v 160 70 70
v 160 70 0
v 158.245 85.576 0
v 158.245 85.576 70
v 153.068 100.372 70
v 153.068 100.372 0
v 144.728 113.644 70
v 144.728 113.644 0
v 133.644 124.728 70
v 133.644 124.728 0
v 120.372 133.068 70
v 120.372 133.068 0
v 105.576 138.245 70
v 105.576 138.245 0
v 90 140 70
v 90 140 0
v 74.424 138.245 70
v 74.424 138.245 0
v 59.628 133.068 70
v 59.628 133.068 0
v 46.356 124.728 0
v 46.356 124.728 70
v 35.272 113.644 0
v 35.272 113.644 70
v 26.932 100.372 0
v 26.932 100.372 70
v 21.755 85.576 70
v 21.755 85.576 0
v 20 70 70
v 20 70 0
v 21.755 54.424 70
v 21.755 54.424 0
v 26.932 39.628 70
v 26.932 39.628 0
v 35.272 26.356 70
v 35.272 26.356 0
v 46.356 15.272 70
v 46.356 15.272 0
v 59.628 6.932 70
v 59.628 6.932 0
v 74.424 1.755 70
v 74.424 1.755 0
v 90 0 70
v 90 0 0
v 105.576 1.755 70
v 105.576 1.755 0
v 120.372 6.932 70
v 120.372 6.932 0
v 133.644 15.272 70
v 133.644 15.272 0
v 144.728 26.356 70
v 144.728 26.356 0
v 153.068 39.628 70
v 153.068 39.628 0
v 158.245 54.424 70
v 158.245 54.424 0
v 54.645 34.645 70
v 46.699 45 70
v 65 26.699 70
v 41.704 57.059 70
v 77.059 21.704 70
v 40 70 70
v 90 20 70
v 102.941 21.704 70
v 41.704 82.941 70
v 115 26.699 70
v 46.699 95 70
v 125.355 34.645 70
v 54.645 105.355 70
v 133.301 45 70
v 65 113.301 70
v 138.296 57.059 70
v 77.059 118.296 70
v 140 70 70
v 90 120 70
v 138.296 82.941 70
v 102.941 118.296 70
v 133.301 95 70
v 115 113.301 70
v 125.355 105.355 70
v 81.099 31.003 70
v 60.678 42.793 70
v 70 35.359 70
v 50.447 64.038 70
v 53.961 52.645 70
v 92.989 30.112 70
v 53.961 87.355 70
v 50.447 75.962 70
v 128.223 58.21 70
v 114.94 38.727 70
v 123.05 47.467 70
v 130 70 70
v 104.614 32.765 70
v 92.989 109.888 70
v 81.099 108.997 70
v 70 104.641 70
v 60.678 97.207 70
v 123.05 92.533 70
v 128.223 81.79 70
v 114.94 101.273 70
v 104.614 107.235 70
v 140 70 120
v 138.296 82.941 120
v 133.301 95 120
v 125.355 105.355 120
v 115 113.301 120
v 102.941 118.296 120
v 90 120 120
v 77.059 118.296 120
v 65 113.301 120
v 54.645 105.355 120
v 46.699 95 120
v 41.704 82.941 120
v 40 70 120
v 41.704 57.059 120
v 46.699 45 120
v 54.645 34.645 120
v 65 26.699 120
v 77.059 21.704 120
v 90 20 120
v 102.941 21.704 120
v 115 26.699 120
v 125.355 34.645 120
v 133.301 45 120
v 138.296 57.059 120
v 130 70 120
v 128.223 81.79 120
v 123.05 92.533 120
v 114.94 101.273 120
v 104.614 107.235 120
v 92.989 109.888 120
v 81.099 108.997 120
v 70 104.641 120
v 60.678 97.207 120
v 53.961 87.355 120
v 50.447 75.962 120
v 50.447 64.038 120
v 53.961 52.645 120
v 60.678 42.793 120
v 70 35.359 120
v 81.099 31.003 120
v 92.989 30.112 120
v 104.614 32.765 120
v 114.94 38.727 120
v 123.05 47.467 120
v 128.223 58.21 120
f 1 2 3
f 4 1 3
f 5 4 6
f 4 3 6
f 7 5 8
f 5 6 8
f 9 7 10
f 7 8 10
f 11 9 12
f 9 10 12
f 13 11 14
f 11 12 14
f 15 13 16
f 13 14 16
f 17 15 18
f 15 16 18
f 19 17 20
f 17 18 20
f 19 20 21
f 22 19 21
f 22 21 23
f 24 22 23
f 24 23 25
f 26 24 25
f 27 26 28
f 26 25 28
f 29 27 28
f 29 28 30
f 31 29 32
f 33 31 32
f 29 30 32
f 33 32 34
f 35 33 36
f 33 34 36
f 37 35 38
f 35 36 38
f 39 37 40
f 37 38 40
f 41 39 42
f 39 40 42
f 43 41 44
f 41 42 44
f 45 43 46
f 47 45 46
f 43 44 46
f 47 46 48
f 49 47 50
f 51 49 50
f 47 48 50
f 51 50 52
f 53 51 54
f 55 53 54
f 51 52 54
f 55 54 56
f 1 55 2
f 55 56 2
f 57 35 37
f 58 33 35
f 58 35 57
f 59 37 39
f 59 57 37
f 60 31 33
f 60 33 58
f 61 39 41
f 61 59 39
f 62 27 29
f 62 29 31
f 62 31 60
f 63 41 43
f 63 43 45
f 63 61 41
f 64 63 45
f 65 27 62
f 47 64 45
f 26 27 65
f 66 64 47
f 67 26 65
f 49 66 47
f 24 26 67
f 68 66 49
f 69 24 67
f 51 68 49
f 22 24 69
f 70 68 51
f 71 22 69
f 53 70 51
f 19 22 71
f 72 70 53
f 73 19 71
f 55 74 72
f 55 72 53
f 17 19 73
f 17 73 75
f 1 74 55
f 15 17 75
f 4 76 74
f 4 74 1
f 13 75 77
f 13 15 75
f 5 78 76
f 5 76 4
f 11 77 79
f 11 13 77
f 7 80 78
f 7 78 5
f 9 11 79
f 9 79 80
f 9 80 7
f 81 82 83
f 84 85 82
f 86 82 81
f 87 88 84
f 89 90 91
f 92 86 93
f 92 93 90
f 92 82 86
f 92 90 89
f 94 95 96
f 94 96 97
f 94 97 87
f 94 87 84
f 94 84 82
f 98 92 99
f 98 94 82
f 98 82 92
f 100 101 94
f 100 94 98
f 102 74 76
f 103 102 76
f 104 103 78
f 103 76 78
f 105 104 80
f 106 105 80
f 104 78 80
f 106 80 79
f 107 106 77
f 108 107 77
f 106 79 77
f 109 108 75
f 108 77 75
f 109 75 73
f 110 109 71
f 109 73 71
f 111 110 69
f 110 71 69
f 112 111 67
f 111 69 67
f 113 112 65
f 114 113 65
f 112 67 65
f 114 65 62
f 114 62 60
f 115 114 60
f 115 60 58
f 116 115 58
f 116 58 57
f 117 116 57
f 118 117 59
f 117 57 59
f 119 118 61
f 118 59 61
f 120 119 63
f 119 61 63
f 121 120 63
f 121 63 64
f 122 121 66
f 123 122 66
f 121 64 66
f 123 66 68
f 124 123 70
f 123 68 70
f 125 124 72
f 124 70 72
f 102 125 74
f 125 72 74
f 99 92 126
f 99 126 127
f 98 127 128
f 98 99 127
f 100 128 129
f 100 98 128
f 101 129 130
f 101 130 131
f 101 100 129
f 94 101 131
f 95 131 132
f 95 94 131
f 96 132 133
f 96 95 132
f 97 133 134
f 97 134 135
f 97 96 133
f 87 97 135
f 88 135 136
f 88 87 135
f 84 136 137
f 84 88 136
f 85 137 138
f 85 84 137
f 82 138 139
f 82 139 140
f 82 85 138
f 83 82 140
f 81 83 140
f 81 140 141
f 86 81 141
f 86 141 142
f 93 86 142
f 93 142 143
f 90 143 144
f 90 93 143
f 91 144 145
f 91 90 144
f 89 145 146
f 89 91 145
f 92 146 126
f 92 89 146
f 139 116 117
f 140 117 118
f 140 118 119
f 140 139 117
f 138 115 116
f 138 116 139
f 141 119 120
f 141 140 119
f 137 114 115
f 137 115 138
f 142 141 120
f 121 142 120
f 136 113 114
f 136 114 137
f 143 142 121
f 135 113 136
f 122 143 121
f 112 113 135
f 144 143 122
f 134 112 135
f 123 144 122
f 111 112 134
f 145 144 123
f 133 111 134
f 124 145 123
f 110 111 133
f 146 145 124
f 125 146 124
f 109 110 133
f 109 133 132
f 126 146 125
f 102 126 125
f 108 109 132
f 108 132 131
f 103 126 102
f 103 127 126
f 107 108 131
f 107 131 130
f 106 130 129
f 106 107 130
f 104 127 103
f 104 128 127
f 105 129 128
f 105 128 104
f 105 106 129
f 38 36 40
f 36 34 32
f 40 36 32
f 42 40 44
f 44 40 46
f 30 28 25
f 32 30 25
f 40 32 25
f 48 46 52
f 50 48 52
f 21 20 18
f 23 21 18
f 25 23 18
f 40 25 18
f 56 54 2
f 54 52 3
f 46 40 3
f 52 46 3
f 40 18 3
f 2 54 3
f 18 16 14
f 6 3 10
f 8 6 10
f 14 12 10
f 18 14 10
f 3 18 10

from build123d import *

# Parameters (mm, degrees)
SKETCH_R      = 70
PAD_DEPTH     = 70
SKETCH001_R   = 50
SKETCH001_R_2 = 40
PAD001_DEPTH  = 50


with BuildPart() as part:
    # Sketch → Pad (new body)
    with BuildSketch(Plane.XY):
        with Locations((90, 70)):
            Circle(SKETCH_R)
    extrude(amount=PAD_DEPTH)

    # Sketch001 (on Face3 of Pad) → Pad001 (join)
    with BuildSketch(Plane.XY.offset(70)):
        with Locations((90, 70)):
            Circle(SKETCH001_R)
        with Locations((90, 70)):
            Circle(SKETCH001_R_2, mode=Mode.SUBTRACT)
    extrude(amount=PAD001_DEPTH)


solid = part.part
